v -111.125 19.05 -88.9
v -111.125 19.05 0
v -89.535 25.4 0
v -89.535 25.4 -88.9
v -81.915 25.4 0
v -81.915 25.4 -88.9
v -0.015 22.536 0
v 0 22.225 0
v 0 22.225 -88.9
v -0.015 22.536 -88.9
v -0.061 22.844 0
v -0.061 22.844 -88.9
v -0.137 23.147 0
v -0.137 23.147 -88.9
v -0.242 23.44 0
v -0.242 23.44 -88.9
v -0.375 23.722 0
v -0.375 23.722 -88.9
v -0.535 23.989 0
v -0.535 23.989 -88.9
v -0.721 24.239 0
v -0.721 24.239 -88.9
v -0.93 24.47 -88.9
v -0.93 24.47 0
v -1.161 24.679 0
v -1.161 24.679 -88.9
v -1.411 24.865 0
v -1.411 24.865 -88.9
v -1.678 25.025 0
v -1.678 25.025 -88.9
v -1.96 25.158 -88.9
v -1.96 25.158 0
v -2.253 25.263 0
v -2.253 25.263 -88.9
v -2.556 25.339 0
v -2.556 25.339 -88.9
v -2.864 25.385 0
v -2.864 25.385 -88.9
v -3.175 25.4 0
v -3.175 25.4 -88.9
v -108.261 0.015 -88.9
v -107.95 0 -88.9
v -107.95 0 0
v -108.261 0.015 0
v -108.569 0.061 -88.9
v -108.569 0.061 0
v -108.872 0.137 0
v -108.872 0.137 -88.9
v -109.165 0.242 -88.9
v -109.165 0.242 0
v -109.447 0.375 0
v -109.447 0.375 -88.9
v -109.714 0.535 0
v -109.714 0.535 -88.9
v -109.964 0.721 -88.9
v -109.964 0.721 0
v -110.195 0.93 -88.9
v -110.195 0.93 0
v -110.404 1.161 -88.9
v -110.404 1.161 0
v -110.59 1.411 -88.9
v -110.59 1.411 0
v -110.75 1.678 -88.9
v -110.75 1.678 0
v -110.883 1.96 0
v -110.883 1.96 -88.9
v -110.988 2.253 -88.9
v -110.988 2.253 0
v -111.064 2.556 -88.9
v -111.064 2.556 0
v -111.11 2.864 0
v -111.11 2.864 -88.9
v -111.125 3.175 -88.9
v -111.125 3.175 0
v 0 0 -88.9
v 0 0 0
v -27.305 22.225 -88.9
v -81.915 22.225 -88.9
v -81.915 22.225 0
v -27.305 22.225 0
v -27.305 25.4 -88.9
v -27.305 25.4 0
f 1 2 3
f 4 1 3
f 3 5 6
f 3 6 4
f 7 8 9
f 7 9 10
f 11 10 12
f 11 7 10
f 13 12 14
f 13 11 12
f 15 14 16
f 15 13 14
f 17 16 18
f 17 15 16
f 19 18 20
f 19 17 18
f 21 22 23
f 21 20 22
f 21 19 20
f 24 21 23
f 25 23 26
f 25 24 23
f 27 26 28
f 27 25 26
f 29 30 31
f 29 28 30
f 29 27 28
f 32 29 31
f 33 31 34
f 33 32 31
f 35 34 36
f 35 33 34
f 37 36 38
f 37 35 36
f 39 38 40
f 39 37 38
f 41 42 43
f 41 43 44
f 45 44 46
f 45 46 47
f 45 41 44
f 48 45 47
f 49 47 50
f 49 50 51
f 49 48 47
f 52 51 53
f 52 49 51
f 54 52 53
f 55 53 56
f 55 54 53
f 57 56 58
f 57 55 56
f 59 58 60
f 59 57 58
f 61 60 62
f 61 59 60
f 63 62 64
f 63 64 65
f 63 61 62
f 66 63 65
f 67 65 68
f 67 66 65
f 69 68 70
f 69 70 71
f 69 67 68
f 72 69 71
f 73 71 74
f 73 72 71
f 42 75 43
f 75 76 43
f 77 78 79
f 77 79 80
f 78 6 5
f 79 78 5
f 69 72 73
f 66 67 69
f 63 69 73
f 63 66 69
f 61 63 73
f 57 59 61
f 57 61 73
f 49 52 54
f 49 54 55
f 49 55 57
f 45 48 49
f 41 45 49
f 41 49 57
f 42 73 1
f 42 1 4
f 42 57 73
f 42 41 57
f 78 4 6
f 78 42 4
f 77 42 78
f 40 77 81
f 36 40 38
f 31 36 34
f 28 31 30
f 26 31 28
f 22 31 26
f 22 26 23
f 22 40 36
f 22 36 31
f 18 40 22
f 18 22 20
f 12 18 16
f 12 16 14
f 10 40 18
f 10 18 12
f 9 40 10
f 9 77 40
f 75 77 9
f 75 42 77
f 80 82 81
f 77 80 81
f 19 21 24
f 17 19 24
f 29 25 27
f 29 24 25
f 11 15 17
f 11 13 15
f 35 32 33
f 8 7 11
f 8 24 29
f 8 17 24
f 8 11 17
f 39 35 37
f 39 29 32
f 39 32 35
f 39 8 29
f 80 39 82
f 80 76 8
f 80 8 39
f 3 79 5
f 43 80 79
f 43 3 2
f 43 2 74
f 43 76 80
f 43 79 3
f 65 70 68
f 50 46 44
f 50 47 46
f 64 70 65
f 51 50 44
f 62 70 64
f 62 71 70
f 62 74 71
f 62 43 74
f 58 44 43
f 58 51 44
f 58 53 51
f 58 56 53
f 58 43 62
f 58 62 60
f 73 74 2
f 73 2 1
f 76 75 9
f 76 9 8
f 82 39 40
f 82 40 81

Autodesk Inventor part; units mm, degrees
ref_plane "YZ Plane" through (0, 0, 0) normal (1, 0, 0) x (0, 1, 0)
ref_plane "XZ Plane" through (0, 0, 0) normal (0, 1, 0) x (-1, 0, 0)
ref_plane "XY Plane" through (0, 0, 0) normal (0, 0, 1) x (1, 0, 0)
sketch "Sketch1" plane through (0, 0, 0) normal (0, 1, 0) x (-1, 0, 0)
  line L0 (0, 0) -> (111.125, 0)
  line L1 (111.125, 0) -> (111.125, -88.9)
  line L2 (111.125, -88.9) -> (0, -88.9)
  line L3 (0, -88.9) -> (0, 0)
  dimension "d0" = 111.125
  dimension "d1" = 88.9
extrude "Extrusion1" add sketch "Sketch1" along normal blind 25.4
sketch "Sketch2" plane through (0, 25.4, 0) normal (0, 1, 0) x (1, 0, 0)
  line L0 (0, 88.9) -> (-111.125, 88.9) projected
  line L1 (-111.125, 0) -> (0, 0) projected
  line L2 (-27.305, 88.9) -> (-81.915, 88.9)
  line L3 (-81.915, 88.9) -> (-81.915, 0)
  line L4 (-81.915, 0) -> (-27.305, 0)
  line L5 (-27.305, 0) -> (-27.305, 88.9)
  line L6 (0, 0) -> (0, 88.9) projected
  dimension "d4" = 111.125
  dimension "d5" = 54.61
  dimension "d6" = 27.305
extrude "Extrusion2" cut sketch "Sketch2" against normal blind 3.175 contours L5 L1 L3 L0
sketch "Sketch4" plane through (-111.125, 0, 0) normal (0, 0, 1) x (1, 0, 0)
  line L0 (0, 0) -> (0, 25.4) projected
  line L1 (0, 19.05) -> (21.59, 25.4)
  line L2 (0, 25.4) -> (29.21, 25.4) projected
  point P0 (111.125, 0)
  dimension "d17" = 6.35
  dimension "d18" = 7.62
extrude "Extrusion4" cut sketch "Sketch4" against normal through all
fillet "Fillet2" radius 3.175 2 edges at (-111.125, 0, -44.45) (0, 25.4, -44.45)
properties part number "lift holder" material "PC/ABS Plastic"
